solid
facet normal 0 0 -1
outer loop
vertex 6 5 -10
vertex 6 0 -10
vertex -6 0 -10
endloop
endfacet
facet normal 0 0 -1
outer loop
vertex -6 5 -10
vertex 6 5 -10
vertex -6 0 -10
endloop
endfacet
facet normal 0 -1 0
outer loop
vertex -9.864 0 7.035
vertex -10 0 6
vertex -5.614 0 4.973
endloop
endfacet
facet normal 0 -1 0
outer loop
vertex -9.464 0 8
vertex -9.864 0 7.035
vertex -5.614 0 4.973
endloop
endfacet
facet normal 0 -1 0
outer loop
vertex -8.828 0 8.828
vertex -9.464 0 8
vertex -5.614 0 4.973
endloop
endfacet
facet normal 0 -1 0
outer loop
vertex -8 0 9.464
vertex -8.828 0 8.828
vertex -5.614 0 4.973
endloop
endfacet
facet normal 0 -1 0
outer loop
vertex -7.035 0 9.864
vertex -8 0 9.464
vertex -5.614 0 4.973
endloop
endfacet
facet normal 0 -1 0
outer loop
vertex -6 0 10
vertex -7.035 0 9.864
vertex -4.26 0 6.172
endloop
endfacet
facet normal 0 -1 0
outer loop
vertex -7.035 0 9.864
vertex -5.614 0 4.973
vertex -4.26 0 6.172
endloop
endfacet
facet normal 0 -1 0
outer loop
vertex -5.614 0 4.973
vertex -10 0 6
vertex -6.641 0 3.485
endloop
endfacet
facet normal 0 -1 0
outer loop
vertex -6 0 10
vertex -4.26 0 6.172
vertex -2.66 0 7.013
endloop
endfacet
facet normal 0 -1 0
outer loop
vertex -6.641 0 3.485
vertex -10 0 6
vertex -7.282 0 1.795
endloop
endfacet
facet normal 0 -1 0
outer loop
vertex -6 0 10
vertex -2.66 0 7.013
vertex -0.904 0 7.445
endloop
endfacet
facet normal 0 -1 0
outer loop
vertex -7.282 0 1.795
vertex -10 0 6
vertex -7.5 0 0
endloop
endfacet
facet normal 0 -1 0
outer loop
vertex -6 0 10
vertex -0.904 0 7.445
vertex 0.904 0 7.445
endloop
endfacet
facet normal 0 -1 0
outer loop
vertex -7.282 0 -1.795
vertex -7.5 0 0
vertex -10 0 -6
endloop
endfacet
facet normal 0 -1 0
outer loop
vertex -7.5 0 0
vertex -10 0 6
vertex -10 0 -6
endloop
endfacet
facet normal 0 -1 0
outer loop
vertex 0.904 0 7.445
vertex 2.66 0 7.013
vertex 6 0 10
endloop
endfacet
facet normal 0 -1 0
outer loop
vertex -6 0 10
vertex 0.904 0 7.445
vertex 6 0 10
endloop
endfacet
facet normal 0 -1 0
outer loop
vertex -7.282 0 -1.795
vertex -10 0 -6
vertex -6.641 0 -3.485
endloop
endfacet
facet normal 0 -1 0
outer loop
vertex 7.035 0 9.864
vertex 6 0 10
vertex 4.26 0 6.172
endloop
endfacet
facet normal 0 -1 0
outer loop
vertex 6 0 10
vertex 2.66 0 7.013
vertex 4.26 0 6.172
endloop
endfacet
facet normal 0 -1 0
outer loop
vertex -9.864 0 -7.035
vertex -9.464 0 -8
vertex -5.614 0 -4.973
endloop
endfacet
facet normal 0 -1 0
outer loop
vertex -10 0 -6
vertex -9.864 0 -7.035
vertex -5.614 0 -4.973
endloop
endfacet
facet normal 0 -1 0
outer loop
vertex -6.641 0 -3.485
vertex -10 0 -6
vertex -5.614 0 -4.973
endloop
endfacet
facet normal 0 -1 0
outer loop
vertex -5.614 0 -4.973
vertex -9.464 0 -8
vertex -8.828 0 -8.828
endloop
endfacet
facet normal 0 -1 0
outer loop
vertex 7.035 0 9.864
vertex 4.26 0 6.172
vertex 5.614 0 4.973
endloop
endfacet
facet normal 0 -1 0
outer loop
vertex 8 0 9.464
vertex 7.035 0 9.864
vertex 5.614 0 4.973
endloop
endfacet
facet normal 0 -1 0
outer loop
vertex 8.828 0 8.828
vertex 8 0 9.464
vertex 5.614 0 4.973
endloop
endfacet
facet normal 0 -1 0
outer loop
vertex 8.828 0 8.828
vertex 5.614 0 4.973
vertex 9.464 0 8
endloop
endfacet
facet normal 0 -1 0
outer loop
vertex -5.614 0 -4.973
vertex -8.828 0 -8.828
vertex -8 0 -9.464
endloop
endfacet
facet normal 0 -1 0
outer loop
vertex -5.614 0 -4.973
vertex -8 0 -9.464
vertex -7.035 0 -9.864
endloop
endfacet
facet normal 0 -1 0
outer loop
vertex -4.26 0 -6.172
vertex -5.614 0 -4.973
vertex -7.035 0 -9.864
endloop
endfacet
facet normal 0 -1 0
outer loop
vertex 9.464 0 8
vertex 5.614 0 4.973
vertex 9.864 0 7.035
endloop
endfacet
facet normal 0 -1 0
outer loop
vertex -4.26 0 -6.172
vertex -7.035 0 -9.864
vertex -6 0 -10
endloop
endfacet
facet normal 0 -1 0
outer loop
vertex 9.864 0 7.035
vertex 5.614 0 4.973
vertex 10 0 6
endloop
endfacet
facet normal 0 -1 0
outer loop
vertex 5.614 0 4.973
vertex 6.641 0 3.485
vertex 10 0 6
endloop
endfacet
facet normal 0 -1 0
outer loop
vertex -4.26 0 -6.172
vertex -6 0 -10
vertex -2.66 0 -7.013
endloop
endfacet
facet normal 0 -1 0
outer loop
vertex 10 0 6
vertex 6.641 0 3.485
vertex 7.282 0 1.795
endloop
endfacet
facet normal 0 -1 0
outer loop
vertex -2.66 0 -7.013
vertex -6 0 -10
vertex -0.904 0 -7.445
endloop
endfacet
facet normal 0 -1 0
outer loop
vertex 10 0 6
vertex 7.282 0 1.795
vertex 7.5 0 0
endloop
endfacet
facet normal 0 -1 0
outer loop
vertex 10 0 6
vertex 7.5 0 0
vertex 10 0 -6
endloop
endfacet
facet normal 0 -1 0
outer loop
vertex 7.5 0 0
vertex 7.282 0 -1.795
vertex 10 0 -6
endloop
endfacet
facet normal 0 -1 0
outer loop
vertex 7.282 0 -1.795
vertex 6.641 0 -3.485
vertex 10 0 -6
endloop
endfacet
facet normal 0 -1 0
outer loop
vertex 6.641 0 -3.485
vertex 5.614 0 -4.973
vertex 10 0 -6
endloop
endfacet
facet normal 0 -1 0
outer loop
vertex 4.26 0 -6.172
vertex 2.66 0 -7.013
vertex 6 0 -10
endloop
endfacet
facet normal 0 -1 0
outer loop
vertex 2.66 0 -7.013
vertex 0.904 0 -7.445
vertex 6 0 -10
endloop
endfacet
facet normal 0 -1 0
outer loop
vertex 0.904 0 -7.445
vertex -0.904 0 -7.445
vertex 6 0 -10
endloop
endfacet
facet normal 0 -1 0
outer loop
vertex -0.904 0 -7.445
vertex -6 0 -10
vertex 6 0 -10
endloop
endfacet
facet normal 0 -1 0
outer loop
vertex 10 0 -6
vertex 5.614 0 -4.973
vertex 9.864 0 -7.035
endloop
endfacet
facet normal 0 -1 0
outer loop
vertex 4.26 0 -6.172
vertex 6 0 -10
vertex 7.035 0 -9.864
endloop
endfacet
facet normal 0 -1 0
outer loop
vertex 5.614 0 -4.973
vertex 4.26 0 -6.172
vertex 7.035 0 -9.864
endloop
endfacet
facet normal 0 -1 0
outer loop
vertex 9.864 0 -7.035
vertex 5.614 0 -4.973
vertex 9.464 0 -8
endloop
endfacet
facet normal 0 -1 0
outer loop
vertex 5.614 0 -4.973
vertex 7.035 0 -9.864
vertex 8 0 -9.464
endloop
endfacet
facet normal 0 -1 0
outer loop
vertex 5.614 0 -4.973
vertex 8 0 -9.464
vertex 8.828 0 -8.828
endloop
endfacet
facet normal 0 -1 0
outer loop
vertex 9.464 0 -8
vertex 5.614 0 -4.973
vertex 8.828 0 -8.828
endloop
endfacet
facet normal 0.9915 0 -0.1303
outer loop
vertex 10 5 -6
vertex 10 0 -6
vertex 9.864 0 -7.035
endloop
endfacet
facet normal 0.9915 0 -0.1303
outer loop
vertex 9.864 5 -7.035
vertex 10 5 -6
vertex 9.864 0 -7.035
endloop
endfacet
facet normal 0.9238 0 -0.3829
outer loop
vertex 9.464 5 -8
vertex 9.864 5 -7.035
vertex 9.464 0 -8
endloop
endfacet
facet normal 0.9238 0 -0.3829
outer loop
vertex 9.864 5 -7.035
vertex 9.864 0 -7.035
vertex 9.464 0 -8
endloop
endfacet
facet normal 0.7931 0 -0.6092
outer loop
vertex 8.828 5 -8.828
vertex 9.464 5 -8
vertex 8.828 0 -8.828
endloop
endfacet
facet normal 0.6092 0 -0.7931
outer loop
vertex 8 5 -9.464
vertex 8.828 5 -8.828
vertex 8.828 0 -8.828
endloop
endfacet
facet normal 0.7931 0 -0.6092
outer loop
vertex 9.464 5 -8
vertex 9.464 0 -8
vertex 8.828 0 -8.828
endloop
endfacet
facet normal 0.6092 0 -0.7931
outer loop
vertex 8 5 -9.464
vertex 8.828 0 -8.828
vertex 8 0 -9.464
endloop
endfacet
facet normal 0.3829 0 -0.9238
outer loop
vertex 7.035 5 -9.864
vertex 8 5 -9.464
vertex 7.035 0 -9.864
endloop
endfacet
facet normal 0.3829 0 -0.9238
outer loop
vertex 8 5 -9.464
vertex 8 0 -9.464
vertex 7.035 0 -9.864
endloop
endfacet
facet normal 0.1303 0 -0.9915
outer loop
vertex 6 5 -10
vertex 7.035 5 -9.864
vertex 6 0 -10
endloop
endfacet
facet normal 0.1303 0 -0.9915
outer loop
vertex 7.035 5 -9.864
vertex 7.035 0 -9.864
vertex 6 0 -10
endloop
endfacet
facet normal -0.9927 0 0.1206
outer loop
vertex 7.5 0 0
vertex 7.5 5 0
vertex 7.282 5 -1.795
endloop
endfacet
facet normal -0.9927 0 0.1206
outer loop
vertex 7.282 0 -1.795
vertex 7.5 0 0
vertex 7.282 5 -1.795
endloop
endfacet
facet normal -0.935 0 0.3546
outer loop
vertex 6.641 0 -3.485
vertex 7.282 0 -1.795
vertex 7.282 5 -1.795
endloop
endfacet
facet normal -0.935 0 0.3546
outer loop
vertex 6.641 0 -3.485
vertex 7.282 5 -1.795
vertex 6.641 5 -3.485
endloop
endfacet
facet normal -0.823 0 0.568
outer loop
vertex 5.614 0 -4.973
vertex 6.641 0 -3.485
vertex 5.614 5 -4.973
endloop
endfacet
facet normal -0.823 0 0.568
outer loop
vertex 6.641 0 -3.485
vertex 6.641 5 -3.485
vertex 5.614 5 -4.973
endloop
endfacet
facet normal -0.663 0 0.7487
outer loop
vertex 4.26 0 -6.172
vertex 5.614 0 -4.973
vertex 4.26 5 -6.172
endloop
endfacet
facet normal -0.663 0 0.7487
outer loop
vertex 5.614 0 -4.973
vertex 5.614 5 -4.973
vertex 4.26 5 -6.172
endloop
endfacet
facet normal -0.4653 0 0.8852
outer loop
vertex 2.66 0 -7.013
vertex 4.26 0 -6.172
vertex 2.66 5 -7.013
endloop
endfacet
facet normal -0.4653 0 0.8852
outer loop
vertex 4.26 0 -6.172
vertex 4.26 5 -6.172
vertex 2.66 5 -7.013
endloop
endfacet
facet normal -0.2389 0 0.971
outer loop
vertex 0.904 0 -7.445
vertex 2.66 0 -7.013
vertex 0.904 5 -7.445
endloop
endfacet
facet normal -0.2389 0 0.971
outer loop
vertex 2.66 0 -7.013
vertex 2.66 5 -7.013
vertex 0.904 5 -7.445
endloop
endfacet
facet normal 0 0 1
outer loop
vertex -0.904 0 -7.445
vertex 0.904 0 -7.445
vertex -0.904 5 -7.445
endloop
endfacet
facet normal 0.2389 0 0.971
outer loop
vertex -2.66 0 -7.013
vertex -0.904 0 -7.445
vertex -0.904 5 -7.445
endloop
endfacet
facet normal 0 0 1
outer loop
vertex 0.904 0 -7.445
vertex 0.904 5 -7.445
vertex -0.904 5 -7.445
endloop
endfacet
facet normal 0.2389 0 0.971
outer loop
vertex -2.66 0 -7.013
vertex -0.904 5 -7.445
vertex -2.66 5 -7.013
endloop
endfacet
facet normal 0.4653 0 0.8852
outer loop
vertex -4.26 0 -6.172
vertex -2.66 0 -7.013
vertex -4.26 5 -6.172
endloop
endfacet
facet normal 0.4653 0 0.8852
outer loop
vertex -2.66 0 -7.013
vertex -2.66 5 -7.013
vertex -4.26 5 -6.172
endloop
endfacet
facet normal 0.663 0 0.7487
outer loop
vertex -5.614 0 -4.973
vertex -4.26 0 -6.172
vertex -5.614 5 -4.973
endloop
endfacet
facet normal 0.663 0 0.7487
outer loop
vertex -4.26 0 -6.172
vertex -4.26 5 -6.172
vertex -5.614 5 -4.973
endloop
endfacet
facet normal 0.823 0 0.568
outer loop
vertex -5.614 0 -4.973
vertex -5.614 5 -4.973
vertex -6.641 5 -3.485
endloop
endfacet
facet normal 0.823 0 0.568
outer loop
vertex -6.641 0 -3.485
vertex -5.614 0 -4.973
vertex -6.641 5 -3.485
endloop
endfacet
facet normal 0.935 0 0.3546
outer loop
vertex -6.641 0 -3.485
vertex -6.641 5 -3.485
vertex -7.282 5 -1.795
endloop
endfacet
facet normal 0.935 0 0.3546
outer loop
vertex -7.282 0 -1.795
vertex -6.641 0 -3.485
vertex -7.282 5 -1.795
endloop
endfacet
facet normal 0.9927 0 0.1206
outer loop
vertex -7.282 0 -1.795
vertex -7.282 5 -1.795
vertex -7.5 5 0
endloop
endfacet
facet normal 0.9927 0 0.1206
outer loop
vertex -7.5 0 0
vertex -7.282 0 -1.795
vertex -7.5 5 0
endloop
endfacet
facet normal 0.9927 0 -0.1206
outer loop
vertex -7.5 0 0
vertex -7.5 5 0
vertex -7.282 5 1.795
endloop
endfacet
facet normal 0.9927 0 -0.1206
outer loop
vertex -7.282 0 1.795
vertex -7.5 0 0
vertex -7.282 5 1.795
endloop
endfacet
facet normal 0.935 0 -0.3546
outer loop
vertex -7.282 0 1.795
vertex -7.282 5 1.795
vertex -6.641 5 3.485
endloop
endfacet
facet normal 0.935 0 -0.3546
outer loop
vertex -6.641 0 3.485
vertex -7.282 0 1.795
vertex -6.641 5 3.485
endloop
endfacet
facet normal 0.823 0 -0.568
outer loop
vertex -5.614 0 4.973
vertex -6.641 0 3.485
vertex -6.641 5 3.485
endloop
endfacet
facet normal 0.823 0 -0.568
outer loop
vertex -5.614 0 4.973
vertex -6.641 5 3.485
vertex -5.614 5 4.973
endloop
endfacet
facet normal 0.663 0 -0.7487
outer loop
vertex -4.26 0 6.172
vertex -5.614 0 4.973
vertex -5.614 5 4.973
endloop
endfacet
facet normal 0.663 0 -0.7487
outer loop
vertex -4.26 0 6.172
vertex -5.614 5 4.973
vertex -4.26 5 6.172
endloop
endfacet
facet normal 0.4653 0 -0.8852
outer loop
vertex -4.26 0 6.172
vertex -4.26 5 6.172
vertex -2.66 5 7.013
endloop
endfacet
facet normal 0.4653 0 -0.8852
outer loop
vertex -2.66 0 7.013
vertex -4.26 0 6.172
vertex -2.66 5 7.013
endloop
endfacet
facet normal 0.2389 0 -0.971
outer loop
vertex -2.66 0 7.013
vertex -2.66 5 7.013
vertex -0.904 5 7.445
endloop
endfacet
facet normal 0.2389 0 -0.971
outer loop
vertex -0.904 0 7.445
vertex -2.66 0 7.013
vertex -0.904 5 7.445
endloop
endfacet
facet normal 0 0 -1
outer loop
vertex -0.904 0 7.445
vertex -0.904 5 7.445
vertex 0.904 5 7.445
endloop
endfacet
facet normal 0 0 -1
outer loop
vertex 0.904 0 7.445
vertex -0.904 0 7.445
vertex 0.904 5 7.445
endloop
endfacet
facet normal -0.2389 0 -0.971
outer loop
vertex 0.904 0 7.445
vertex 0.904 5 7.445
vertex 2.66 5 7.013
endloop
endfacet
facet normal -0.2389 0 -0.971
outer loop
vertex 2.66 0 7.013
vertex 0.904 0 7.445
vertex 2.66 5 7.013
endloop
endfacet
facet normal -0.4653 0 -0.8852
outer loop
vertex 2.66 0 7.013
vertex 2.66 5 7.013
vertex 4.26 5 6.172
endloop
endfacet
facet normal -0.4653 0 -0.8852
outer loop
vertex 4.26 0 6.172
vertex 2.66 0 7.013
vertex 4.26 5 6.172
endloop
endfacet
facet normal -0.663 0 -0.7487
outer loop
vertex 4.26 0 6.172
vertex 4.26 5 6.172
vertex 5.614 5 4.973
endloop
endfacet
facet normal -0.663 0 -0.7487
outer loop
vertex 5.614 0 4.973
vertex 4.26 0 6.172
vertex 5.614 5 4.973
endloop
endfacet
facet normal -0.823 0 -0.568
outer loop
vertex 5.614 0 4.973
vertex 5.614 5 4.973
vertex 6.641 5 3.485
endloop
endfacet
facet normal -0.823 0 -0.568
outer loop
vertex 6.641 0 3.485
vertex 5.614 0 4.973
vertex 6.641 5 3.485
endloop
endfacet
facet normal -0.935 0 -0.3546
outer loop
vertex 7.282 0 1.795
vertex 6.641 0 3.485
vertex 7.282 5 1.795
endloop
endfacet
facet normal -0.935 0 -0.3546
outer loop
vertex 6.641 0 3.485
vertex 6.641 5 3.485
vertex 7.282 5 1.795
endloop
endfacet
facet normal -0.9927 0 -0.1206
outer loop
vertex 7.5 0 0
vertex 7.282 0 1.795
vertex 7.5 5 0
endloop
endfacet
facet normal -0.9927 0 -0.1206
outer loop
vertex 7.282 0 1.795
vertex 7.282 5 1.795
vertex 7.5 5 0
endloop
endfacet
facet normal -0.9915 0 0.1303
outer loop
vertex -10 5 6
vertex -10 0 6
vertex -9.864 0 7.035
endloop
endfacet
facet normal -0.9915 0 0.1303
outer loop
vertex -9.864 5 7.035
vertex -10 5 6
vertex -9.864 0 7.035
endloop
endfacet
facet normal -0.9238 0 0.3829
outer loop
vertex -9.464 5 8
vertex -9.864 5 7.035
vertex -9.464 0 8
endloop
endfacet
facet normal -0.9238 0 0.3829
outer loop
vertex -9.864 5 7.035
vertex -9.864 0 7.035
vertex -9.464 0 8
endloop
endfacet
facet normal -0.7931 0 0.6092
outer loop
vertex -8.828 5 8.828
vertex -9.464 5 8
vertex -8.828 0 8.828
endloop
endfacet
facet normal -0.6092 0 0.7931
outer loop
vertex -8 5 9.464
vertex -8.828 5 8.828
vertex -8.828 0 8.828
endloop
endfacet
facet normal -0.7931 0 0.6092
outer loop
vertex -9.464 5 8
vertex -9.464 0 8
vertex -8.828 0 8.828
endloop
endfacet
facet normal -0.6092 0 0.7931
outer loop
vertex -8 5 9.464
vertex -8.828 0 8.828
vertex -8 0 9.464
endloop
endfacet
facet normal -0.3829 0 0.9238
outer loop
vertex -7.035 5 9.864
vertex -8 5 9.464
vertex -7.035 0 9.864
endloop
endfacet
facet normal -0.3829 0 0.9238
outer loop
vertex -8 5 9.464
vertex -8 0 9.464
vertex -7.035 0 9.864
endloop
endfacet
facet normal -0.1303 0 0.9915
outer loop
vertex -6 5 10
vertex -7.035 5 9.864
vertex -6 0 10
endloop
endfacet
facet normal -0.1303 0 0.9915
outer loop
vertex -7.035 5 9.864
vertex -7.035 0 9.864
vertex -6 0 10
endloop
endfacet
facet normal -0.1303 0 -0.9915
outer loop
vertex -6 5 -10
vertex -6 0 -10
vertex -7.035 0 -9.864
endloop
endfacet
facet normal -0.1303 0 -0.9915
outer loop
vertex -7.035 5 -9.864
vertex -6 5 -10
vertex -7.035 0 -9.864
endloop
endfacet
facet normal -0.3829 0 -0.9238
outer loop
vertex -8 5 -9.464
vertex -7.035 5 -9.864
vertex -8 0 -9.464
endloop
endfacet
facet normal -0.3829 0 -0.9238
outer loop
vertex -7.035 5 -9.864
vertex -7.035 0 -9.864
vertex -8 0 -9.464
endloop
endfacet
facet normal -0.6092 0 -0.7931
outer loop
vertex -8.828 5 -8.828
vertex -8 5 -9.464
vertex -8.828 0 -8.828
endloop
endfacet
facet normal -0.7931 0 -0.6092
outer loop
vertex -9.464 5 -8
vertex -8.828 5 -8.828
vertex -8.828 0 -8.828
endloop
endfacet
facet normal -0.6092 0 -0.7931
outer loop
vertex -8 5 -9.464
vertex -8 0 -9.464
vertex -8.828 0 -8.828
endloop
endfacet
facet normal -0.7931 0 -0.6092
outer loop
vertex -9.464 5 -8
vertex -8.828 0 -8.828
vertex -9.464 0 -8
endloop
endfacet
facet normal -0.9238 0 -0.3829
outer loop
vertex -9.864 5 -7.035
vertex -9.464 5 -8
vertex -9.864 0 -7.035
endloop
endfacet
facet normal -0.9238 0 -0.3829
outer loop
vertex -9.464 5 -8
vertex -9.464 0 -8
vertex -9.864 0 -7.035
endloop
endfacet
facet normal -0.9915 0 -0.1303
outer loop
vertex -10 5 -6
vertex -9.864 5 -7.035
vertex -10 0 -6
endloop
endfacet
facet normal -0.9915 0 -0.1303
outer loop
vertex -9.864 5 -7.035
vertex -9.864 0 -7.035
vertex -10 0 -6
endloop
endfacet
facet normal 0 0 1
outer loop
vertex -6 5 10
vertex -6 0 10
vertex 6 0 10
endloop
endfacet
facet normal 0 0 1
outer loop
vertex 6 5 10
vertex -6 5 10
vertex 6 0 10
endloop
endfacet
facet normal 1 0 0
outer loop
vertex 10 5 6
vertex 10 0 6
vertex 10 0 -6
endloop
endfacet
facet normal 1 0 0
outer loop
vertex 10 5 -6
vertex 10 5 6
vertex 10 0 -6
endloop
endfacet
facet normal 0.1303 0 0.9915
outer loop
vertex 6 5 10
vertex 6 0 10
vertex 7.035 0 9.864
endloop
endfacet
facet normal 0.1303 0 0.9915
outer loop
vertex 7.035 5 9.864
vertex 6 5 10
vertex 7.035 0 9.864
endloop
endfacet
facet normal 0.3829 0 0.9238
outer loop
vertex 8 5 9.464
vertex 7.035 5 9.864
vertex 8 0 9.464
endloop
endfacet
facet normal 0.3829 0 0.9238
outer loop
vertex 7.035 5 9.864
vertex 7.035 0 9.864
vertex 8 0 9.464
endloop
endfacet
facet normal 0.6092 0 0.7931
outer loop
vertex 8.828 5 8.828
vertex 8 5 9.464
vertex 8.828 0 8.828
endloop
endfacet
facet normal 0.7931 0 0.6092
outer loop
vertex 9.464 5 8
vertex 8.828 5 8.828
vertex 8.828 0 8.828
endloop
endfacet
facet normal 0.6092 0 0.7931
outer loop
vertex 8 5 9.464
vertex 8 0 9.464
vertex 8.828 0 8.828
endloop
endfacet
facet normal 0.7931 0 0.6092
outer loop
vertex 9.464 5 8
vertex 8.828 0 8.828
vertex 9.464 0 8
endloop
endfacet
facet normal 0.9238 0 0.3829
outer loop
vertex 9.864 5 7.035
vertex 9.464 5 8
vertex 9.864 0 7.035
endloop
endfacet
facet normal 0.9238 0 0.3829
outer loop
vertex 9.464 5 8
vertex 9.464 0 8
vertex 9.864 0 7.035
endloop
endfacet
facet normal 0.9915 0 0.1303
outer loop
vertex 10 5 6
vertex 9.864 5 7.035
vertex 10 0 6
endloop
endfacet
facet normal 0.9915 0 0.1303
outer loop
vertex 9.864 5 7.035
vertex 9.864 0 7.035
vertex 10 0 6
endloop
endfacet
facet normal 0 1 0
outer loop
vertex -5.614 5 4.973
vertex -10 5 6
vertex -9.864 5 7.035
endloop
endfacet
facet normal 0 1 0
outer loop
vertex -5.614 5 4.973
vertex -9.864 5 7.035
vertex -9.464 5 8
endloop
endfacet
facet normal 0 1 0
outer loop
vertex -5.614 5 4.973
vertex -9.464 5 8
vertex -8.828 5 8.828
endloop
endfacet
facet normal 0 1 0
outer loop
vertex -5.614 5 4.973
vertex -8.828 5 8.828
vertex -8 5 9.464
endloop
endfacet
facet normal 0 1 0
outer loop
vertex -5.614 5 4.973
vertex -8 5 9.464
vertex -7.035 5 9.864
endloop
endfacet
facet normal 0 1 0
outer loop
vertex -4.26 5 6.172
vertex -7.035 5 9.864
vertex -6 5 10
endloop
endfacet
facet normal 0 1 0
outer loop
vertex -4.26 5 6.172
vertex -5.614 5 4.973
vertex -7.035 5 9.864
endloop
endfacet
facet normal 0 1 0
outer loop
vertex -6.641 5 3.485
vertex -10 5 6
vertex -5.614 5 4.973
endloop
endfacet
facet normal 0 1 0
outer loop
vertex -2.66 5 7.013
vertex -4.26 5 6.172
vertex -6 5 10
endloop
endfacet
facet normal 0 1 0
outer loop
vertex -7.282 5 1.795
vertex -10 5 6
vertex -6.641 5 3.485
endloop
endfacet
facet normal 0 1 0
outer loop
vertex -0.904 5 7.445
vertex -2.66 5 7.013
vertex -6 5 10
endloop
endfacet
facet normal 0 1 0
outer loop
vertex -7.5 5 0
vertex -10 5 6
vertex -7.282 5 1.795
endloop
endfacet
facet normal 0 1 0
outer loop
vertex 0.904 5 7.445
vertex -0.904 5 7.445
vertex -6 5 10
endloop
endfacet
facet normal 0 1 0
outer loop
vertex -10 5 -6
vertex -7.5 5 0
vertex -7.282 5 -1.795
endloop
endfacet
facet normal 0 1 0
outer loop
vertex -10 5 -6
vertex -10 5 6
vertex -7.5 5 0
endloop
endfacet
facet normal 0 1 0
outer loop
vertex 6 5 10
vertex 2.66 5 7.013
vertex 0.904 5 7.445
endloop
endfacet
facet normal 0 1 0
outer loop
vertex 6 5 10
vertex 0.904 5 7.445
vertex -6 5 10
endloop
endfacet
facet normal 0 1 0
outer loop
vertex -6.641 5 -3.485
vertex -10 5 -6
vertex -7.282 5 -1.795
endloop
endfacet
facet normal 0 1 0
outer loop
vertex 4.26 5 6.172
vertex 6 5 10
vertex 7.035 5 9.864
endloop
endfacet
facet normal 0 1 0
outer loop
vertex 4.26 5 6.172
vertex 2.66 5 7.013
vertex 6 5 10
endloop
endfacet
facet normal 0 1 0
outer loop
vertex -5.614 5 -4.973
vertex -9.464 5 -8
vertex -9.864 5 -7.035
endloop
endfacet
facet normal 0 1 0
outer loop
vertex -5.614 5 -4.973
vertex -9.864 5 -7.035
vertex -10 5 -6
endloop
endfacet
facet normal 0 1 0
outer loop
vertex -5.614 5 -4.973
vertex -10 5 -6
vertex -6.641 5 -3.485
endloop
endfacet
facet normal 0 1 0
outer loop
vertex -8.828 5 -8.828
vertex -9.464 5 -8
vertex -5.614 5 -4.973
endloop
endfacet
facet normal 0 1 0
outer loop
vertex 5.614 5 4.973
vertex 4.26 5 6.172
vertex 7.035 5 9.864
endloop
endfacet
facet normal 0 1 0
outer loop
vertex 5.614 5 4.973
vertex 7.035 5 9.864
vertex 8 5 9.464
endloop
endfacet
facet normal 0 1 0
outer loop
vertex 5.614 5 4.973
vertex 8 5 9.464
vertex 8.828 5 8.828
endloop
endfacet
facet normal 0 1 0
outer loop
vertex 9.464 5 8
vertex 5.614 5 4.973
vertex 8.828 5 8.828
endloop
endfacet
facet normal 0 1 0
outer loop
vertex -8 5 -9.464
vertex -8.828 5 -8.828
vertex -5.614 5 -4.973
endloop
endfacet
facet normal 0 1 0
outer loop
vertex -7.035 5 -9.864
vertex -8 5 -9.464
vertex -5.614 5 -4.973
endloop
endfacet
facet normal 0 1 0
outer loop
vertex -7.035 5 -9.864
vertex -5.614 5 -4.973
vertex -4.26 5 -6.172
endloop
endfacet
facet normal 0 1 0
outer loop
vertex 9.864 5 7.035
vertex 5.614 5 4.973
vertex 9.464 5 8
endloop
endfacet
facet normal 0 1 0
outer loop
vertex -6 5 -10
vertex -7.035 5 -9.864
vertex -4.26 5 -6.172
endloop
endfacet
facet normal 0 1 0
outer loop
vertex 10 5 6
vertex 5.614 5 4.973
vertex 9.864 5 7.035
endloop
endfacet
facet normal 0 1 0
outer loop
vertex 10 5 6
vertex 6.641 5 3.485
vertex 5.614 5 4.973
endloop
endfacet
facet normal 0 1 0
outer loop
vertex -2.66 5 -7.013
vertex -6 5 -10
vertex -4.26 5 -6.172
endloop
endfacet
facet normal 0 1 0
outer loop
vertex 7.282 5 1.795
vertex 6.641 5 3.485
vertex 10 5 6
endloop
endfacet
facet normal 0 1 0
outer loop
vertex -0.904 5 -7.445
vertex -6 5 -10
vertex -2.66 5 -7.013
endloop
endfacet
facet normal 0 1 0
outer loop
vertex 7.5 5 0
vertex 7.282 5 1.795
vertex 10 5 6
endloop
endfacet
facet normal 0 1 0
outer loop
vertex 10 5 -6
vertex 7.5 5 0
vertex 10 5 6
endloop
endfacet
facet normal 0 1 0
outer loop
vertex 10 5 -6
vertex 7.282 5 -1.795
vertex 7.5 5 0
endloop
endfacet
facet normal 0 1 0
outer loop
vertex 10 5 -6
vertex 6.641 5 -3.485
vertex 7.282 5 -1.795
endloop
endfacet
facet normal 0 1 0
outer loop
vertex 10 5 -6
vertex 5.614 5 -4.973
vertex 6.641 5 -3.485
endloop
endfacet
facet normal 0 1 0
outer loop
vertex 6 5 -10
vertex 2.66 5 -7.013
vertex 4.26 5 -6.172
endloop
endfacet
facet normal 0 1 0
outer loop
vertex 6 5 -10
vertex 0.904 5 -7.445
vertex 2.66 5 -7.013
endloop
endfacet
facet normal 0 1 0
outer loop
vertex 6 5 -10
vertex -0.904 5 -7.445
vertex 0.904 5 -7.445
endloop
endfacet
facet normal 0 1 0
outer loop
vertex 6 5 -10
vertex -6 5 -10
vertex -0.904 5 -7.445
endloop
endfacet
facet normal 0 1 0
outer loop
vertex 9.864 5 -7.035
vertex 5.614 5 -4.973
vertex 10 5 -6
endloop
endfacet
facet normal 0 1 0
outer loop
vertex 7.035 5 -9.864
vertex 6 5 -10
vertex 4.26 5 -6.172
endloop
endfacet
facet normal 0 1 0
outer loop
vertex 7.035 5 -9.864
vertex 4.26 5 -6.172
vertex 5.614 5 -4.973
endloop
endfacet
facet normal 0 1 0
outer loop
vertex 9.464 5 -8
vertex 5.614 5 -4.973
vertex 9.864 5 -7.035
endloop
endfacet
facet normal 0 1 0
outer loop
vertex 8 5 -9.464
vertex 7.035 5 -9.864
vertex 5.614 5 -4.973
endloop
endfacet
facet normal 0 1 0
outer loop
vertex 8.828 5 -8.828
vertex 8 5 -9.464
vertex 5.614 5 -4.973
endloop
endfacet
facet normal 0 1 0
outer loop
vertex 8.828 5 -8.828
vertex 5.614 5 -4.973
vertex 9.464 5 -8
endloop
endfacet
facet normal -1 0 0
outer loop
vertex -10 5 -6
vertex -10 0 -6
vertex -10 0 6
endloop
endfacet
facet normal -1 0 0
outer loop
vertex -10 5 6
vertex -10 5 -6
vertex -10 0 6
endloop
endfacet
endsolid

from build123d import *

# Parameters (mm, degrees)
SALIENTE_EXTRUIR1_DEPTH = 5
CROQUIS2_R              = 7.5
CORTAR_EXTRUIR1_DEPTH   = 6


with BuildPart() as part:
    # Croquis1 → Saliente-Extruir1 (new body)
    with BuildSketch(Plane(origin=(0, 0, 0), x_dir=(1, 0, 0), z_dir=(0, 1, 0))):
        with BuildLine():
            Line((-6, -10), (6, -10))
            ThreePointArc((6, -10), (8.828427125, -8.828427125), (10, -6))
            Line((10, -6), (10, 6))
            ThreePointArc((10, 6), (8.828427125, 8.828427125), (6, 10))
            Line((6, 10), (-6, 10))
            ThreePointArc((-6, 10), (-8.828427125, 8.828427125), (-10, 6))
            Line((-10, 6), (-10, -6))
            ThreePointArc((-10, -6), (-8.828427125, -8.828427125), (-6, -10))
        make_face()
    extrude(amount=SALIENTE_EXTRUIR1_DEPTH)

    # Croquis2 → Cortar-Extruir1 (cut, through all)
    with BuildSketch(Plane(origin=(0, 5, 0), x_dir=(1, 0, 0), z_dir=(0, 1, 0))):
        Circle(CROQUIS2_R)
    extrude(amount=-CORTAR_EXTRUIR1_DEPTH, mode=Mode.SUBTRACT)


solid = part.part
